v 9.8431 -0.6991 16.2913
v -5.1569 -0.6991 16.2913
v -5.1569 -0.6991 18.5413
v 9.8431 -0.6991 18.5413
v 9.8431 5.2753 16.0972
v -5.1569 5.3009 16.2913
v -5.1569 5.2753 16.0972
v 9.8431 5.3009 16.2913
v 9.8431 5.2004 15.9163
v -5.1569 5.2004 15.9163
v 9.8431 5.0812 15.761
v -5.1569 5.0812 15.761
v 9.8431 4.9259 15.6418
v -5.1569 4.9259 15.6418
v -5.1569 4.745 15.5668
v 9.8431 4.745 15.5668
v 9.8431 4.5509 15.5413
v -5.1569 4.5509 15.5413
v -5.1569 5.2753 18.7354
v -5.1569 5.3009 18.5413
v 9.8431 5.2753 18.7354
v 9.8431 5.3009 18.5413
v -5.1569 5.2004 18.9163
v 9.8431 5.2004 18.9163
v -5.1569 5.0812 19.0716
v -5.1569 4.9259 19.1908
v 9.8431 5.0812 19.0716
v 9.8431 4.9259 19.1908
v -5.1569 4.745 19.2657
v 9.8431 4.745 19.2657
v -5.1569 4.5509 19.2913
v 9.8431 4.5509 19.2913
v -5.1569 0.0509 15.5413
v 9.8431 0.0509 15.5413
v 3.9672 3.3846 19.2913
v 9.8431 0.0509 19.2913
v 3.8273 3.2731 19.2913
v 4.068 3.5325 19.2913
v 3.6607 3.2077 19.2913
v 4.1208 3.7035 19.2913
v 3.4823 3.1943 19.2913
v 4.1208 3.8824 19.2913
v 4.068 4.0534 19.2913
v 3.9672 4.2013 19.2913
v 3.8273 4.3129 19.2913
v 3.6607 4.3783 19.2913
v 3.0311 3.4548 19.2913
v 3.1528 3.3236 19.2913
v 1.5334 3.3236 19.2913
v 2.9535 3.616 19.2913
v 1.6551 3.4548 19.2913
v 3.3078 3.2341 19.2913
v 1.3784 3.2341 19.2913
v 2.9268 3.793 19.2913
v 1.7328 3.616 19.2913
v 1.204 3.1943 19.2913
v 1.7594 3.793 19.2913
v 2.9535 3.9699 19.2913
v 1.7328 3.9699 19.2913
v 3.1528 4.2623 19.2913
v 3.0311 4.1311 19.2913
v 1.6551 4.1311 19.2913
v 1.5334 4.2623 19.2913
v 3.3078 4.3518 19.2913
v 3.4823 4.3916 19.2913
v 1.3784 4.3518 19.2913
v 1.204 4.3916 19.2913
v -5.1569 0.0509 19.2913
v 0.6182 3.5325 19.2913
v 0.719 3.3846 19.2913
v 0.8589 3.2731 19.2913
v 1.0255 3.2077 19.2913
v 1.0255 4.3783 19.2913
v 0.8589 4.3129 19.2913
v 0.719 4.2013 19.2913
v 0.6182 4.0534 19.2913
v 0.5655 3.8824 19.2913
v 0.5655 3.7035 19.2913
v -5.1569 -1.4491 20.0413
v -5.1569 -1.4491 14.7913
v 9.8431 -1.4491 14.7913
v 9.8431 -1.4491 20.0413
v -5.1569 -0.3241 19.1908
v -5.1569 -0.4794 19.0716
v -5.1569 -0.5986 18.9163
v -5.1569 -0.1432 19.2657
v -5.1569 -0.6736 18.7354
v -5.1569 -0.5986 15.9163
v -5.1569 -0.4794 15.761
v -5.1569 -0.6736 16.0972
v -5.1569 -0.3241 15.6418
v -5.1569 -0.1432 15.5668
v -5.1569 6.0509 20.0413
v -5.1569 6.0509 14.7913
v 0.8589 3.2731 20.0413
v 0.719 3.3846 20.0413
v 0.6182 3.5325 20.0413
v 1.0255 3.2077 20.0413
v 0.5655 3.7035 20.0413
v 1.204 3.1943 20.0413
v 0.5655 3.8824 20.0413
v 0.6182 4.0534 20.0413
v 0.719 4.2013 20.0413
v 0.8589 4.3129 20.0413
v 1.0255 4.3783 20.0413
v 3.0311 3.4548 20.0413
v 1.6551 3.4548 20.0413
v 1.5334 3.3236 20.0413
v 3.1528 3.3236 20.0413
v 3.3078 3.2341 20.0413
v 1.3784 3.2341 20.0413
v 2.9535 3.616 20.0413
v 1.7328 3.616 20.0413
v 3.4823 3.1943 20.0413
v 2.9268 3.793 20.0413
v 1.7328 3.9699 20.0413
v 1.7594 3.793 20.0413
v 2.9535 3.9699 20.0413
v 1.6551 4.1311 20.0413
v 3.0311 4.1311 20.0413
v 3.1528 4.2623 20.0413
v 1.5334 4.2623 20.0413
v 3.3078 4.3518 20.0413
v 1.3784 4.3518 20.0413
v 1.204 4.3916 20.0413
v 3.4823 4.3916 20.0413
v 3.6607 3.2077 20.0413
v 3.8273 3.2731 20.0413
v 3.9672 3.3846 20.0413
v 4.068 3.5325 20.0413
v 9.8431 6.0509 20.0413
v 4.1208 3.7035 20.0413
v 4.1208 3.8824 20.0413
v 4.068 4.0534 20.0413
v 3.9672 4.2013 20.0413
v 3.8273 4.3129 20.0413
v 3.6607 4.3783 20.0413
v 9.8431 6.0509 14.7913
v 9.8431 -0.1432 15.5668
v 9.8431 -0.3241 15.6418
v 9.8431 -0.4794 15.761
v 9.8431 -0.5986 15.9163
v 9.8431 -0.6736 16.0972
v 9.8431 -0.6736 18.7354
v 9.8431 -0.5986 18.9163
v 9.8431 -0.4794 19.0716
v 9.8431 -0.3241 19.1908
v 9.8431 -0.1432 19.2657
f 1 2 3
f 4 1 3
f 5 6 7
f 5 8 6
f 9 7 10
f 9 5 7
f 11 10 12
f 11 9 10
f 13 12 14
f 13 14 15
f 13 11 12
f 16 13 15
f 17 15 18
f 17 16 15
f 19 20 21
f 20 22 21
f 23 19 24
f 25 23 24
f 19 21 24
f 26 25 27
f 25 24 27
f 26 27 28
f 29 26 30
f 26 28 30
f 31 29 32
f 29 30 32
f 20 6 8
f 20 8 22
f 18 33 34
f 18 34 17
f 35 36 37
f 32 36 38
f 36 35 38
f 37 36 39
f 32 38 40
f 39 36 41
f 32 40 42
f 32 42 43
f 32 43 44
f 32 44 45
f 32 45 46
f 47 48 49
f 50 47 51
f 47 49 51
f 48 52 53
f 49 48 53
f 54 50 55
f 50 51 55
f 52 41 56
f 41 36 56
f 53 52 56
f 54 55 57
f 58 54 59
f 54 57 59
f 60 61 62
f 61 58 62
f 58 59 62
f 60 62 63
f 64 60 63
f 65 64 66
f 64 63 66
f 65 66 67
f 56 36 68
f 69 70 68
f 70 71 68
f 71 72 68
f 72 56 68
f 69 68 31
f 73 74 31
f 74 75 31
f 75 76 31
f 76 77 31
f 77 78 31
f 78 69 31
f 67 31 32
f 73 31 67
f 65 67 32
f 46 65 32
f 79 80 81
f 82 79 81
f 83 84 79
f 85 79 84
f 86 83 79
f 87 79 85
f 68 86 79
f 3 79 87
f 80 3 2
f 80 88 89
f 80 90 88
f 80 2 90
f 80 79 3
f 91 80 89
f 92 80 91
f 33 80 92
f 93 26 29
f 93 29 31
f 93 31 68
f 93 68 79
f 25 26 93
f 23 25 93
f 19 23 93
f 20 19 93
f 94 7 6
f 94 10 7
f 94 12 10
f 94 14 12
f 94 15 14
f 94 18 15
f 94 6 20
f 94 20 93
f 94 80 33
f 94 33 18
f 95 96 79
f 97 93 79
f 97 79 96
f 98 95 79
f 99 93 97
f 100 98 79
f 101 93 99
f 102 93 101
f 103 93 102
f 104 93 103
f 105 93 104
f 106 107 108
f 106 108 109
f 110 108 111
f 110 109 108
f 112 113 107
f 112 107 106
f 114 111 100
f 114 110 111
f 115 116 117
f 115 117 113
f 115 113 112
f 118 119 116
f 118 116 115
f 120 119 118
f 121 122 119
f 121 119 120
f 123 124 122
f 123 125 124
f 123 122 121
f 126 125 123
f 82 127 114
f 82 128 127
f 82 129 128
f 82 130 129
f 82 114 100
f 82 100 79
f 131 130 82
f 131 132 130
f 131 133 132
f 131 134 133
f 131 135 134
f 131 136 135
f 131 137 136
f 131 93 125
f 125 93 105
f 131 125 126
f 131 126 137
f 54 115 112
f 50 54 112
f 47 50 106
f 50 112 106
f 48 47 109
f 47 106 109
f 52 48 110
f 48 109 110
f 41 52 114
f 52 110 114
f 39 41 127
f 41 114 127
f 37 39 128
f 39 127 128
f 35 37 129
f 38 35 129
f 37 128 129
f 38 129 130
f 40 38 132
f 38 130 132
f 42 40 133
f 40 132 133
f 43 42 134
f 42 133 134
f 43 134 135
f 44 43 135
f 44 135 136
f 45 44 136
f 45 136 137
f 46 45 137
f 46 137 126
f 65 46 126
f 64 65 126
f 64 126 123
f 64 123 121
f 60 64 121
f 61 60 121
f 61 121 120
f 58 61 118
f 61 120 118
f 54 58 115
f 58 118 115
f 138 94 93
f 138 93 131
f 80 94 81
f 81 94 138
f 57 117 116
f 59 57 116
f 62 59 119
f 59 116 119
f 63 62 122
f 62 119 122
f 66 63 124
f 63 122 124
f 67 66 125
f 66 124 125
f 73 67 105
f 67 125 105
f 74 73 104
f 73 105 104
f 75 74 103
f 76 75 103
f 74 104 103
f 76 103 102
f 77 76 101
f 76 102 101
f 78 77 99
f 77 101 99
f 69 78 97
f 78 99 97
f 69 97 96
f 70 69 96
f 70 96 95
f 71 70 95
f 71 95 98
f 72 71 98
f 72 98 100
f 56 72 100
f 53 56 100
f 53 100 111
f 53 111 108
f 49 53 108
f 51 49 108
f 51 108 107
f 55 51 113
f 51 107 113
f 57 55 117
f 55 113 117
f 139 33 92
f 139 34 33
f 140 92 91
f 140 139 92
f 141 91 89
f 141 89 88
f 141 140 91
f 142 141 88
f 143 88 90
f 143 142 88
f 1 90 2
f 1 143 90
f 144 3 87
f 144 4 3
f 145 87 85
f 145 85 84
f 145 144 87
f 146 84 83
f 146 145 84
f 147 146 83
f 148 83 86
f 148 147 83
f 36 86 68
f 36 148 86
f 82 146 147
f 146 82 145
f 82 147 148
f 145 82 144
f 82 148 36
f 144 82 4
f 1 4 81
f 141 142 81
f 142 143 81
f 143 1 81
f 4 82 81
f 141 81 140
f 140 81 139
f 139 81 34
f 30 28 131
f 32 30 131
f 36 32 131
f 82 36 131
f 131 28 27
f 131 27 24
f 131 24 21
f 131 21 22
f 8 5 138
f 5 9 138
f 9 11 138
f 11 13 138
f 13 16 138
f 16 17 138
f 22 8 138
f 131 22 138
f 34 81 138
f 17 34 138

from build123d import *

# Parameters (mm, degrees)
SKETCH3_W           = 100
SKETCH3_H           = 50
BOSS_EXTRUDE1_DEPTH = 35
SKETCH4_W           = 25
SKETCH4_H           = 40
CUT_EXTRUDE2_DEPTH  = 100
SKETCH5_R           = 4.002277078
CUT_EXTRUDE4_DEPTH  = 5
FILLET2_R           = 5
FILLET3_R           = 5
FILLET4_R           = 5
FILLET5_R           = 5
SCALE1_SCALE        = 0.15


with BuildPart() as part:
    # Sketch3 → Boss-Extrude1 (new body)
    with BuildSketch(Plane.XY):
        with Locations((2.343116294, 2.356397797)):
            Rectangle(SKETCH3_W, SKETCH3_H)
    extrude(amount=BOSS_EXTRUDE1_DEPTH)

    # Sketch4 → Cut-Extrude2 (cut)
    with BuildSketch(Plane.ZY.offset(47.656883706)):
        with Locations((17.5, 2.356397797)):
            Rectangle(SKETCH4_W, SKETCH4_H)
    extrude(amount=-CUT_EXTRUDE2_DEPTH, mode=Mode.SUBTRACT)

    # Sketch5 → Cut-Extrude4 (cut)
    with BuildSketch(Plane.XY.offset(35)):
        with Locations((-5.550407573, 12.303618629)):
            Circle(SKETCH5_R)
        with Locations(Location((10.236640162, 12.303618629, 0), (0, 0, 180))):
            Circle(SKETCH5_R)
    extrude(amount=-CUT_EXTRUDE4_DEPTH, mode=Mode.SUBTRACT)

    # Fillet2
    fillet2_edges = [part.edges().sort_by_distance(p)[0] for p in [
        (2.343116294, 22.356397797, 5),
    ]]
    fillet(fillet2_edges, radius=FILLET2_R)

    # Fillet3
    fillet3_edges = [part.edges().sort_by_distance(p)[0] for p in [
        (2.343116294, 22.356397797, 30),
    ]]
    fillet(fillet3_edges, radius=FILLET3_R)

    # Fillet4
    fillet4_edges = [part.edges().sort_by_distance(p)[0] for p in [
        (2.343116294, -17.643602203, 5),
    ]]
    fillet(fillet4_edges, radius=FILLET4_R)

    # Fillet5
    fillet5_edges = [part.edges().sort_by_distance(p)[0] for p in [
        (2.343116294, -17.643602203, 30),
    ]]
    fillet(fillet5_edges, radius=FILLET5_R)


with BuildPart() as part_1:
    # Scale1: scaled about (2.343116294, 2.291085551, 17.401511818)
    add(part.part.scale(SCALE1_SCALE).moved(Location((1.99164885, 1.947422718, 14.791285045))))


solid = part_1.part
